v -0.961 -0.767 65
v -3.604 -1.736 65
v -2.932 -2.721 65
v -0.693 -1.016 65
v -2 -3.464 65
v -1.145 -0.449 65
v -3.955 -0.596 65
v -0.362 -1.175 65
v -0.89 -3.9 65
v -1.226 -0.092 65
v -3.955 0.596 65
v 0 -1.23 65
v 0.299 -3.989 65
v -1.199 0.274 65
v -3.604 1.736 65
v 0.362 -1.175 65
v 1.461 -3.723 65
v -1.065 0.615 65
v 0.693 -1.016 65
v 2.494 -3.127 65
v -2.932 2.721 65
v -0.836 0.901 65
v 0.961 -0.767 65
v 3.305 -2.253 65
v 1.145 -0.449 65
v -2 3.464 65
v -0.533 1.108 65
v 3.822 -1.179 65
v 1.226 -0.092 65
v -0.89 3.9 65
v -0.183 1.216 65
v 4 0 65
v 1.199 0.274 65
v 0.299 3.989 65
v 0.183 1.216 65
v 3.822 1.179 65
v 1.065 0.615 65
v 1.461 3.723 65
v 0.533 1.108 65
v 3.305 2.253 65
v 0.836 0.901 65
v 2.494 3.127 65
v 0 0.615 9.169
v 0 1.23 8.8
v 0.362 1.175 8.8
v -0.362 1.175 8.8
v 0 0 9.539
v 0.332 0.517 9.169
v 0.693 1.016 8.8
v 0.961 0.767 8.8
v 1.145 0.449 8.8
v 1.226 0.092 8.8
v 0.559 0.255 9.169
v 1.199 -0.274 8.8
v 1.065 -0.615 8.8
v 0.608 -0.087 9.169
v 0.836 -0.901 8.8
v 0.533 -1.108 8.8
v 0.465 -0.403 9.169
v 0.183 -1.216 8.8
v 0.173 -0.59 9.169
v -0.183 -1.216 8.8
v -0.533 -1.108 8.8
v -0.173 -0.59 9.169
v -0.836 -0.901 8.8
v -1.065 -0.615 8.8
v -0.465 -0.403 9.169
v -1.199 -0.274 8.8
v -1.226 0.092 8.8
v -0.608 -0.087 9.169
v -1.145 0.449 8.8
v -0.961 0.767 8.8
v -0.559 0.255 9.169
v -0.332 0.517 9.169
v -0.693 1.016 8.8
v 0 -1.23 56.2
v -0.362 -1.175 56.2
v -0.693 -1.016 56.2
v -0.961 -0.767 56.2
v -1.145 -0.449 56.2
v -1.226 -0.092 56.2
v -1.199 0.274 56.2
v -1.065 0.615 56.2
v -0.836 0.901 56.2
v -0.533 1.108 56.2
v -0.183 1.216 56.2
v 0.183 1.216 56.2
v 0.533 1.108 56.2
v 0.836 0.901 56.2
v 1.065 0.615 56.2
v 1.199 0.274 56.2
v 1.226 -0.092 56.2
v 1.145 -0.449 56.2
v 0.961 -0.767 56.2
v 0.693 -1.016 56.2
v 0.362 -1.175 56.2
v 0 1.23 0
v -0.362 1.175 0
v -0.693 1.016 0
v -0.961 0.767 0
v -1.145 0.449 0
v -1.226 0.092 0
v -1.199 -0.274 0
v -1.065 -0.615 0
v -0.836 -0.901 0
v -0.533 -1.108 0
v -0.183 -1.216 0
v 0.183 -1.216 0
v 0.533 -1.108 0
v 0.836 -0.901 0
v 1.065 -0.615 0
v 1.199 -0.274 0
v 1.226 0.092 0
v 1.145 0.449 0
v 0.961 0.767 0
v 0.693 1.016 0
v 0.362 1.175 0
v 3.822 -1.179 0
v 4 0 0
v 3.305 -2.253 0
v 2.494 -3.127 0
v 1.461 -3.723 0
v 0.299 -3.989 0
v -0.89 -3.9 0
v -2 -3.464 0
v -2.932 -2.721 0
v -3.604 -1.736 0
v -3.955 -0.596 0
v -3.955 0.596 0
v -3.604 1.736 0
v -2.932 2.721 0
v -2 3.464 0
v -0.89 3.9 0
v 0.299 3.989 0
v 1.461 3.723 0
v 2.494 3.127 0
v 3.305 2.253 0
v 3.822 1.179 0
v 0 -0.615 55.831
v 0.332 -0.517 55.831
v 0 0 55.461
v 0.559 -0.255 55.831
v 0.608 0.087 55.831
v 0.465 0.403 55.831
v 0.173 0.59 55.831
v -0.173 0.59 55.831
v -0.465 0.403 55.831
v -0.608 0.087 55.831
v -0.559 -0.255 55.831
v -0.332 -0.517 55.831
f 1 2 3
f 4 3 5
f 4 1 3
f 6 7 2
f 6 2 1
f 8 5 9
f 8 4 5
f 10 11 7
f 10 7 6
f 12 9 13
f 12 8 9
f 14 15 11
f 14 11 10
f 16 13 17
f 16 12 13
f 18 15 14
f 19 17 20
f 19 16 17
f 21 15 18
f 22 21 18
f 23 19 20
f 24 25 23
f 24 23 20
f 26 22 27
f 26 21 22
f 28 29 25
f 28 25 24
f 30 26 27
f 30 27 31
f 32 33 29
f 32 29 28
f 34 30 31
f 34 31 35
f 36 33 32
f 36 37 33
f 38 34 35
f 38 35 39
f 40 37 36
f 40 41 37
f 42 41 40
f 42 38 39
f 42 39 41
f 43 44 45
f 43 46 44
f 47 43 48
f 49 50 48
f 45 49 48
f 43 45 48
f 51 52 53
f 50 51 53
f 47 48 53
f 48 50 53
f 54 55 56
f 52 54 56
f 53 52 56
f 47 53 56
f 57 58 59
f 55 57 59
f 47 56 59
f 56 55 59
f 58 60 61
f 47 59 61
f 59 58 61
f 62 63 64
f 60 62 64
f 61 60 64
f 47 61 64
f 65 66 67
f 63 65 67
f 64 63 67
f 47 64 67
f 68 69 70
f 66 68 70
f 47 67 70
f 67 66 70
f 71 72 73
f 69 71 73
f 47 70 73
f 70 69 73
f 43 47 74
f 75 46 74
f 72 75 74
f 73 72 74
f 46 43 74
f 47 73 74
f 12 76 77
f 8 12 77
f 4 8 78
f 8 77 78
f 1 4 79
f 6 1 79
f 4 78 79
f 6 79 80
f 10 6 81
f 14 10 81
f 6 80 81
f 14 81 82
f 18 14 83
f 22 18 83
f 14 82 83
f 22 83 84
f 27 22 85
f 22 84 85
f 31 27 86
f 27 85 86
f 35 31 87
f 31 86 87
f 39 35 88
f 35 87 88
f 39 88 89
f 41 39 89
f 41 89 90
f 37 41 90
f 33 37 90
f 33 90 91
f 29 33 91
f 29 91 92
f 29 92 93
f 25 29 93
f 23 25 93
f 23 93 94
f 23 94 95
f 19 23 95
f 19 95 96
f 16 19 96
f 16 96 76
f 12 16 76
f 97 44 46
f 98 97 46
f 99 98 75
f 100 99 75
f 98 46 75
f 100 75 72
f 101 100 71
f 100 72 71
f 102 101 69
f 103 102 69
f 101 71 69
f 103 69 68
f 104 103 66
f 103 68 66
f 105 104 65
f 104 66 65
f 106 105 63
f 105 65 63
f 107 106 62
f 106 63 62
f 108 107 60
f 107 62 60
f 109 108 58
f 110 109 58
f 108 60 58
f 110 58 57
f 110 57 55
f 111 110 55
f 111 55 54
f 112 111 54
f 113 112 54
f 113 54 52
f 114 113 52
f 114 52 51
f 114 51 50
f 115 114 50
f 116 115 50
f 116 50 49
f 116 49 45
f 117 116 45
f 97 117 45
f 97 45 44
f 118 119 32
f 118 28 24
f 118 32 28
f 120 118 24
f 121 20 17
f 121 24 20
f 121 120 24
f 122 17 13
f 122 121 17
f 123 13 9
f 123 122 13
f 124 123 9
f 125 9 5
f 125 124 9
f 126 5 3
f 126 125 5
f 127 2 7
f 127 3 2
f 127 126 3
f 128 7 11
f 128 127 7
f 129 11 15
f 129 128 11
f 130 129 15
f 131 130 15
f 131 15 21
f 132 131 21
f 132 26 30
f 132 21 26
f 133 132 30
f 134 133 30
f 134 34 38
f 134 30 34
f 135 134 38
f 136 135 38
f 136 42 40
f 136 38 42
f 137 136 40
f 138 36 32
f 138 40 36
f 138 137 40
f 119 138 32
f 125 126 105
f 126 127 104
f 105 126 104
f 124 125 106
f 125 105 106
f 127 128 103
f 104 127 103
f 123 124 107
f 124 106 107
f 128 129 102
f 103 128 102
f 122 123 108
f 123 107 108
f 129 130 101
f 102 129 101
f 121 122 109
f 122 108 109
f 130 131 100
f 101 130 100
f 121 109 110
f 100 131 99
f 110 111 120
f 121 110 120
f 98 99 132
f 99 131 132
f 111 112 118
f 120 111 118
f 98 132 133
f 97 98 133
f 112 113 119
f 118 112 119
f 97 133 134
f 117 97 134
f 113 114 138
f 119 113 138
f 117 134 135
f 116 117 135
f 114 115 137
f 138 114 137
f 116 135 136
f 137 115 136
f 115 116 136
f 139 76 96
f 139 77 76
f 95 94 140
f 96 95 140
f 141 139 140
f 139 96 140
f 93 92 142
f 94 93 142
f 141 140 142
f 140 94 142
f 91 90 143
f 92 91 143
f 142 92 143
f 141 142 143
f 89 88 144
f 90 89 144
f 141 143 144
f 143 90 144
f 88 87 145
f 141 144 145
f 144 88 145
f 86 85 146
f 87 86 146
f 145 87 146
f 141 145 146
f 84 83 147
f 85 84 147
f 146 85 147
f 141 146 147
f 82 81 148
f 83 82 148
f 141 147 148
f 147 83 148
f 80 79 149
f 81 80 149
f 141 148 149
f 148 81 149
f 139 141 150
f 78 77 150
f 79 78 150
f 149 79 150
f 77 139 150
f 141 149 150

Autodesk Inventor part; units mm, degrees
ref_plane "YZ Plane" through (0, 0, 0) normal (1, 0, 0) x (0, 1, 0)
ref_plane "XZ Plane" through (0, 0, 0) normal (0, 1, 0) x (-1, 0, 0)
ref_plane "XY Plane" through (0, 0, 0) normal (0, 0, 1) x (1, 0, 0)
sketch "スケッチ1" plane through (0, 0, 0) normal (0, 0, 1) x (1, 0, 0)
  circle A0 centre (0, 0) radius 4
  dimension "d0" = 8
extrude "押し出し1" add sketch "スケッチ1" along normal blind 65
sketch "スケッチ2" plane through (0, 0, 65) normal (0, 0, 1) x (1, 0, 0)
  point P0 (0, 0)
  point P1 (0, 0)
hole "穴1" at (0, 0, 65) direction (0, 0, -1) diameter 2.459 depth 8.8 tip angle 118 thread size "M3x0.5" class "6H" standard "ANSI Metric M Profile"
sketch "スケッチ3" plane through (0, 0, 0) normal (0, 0, -1) x (-1, 0, 0)
  circle A0 centre (0, 0) radius 1.2295 projected
hole "穴2" at (0, 0, 0) direction (0, 0, 1) diameter 2.459 depth 8.8 tip angle 118 thread size "M3x0.5" class "6H" standard "ANSI Metric M Profile"
properties part number "link1part4" material "アルミニウム 6061"
